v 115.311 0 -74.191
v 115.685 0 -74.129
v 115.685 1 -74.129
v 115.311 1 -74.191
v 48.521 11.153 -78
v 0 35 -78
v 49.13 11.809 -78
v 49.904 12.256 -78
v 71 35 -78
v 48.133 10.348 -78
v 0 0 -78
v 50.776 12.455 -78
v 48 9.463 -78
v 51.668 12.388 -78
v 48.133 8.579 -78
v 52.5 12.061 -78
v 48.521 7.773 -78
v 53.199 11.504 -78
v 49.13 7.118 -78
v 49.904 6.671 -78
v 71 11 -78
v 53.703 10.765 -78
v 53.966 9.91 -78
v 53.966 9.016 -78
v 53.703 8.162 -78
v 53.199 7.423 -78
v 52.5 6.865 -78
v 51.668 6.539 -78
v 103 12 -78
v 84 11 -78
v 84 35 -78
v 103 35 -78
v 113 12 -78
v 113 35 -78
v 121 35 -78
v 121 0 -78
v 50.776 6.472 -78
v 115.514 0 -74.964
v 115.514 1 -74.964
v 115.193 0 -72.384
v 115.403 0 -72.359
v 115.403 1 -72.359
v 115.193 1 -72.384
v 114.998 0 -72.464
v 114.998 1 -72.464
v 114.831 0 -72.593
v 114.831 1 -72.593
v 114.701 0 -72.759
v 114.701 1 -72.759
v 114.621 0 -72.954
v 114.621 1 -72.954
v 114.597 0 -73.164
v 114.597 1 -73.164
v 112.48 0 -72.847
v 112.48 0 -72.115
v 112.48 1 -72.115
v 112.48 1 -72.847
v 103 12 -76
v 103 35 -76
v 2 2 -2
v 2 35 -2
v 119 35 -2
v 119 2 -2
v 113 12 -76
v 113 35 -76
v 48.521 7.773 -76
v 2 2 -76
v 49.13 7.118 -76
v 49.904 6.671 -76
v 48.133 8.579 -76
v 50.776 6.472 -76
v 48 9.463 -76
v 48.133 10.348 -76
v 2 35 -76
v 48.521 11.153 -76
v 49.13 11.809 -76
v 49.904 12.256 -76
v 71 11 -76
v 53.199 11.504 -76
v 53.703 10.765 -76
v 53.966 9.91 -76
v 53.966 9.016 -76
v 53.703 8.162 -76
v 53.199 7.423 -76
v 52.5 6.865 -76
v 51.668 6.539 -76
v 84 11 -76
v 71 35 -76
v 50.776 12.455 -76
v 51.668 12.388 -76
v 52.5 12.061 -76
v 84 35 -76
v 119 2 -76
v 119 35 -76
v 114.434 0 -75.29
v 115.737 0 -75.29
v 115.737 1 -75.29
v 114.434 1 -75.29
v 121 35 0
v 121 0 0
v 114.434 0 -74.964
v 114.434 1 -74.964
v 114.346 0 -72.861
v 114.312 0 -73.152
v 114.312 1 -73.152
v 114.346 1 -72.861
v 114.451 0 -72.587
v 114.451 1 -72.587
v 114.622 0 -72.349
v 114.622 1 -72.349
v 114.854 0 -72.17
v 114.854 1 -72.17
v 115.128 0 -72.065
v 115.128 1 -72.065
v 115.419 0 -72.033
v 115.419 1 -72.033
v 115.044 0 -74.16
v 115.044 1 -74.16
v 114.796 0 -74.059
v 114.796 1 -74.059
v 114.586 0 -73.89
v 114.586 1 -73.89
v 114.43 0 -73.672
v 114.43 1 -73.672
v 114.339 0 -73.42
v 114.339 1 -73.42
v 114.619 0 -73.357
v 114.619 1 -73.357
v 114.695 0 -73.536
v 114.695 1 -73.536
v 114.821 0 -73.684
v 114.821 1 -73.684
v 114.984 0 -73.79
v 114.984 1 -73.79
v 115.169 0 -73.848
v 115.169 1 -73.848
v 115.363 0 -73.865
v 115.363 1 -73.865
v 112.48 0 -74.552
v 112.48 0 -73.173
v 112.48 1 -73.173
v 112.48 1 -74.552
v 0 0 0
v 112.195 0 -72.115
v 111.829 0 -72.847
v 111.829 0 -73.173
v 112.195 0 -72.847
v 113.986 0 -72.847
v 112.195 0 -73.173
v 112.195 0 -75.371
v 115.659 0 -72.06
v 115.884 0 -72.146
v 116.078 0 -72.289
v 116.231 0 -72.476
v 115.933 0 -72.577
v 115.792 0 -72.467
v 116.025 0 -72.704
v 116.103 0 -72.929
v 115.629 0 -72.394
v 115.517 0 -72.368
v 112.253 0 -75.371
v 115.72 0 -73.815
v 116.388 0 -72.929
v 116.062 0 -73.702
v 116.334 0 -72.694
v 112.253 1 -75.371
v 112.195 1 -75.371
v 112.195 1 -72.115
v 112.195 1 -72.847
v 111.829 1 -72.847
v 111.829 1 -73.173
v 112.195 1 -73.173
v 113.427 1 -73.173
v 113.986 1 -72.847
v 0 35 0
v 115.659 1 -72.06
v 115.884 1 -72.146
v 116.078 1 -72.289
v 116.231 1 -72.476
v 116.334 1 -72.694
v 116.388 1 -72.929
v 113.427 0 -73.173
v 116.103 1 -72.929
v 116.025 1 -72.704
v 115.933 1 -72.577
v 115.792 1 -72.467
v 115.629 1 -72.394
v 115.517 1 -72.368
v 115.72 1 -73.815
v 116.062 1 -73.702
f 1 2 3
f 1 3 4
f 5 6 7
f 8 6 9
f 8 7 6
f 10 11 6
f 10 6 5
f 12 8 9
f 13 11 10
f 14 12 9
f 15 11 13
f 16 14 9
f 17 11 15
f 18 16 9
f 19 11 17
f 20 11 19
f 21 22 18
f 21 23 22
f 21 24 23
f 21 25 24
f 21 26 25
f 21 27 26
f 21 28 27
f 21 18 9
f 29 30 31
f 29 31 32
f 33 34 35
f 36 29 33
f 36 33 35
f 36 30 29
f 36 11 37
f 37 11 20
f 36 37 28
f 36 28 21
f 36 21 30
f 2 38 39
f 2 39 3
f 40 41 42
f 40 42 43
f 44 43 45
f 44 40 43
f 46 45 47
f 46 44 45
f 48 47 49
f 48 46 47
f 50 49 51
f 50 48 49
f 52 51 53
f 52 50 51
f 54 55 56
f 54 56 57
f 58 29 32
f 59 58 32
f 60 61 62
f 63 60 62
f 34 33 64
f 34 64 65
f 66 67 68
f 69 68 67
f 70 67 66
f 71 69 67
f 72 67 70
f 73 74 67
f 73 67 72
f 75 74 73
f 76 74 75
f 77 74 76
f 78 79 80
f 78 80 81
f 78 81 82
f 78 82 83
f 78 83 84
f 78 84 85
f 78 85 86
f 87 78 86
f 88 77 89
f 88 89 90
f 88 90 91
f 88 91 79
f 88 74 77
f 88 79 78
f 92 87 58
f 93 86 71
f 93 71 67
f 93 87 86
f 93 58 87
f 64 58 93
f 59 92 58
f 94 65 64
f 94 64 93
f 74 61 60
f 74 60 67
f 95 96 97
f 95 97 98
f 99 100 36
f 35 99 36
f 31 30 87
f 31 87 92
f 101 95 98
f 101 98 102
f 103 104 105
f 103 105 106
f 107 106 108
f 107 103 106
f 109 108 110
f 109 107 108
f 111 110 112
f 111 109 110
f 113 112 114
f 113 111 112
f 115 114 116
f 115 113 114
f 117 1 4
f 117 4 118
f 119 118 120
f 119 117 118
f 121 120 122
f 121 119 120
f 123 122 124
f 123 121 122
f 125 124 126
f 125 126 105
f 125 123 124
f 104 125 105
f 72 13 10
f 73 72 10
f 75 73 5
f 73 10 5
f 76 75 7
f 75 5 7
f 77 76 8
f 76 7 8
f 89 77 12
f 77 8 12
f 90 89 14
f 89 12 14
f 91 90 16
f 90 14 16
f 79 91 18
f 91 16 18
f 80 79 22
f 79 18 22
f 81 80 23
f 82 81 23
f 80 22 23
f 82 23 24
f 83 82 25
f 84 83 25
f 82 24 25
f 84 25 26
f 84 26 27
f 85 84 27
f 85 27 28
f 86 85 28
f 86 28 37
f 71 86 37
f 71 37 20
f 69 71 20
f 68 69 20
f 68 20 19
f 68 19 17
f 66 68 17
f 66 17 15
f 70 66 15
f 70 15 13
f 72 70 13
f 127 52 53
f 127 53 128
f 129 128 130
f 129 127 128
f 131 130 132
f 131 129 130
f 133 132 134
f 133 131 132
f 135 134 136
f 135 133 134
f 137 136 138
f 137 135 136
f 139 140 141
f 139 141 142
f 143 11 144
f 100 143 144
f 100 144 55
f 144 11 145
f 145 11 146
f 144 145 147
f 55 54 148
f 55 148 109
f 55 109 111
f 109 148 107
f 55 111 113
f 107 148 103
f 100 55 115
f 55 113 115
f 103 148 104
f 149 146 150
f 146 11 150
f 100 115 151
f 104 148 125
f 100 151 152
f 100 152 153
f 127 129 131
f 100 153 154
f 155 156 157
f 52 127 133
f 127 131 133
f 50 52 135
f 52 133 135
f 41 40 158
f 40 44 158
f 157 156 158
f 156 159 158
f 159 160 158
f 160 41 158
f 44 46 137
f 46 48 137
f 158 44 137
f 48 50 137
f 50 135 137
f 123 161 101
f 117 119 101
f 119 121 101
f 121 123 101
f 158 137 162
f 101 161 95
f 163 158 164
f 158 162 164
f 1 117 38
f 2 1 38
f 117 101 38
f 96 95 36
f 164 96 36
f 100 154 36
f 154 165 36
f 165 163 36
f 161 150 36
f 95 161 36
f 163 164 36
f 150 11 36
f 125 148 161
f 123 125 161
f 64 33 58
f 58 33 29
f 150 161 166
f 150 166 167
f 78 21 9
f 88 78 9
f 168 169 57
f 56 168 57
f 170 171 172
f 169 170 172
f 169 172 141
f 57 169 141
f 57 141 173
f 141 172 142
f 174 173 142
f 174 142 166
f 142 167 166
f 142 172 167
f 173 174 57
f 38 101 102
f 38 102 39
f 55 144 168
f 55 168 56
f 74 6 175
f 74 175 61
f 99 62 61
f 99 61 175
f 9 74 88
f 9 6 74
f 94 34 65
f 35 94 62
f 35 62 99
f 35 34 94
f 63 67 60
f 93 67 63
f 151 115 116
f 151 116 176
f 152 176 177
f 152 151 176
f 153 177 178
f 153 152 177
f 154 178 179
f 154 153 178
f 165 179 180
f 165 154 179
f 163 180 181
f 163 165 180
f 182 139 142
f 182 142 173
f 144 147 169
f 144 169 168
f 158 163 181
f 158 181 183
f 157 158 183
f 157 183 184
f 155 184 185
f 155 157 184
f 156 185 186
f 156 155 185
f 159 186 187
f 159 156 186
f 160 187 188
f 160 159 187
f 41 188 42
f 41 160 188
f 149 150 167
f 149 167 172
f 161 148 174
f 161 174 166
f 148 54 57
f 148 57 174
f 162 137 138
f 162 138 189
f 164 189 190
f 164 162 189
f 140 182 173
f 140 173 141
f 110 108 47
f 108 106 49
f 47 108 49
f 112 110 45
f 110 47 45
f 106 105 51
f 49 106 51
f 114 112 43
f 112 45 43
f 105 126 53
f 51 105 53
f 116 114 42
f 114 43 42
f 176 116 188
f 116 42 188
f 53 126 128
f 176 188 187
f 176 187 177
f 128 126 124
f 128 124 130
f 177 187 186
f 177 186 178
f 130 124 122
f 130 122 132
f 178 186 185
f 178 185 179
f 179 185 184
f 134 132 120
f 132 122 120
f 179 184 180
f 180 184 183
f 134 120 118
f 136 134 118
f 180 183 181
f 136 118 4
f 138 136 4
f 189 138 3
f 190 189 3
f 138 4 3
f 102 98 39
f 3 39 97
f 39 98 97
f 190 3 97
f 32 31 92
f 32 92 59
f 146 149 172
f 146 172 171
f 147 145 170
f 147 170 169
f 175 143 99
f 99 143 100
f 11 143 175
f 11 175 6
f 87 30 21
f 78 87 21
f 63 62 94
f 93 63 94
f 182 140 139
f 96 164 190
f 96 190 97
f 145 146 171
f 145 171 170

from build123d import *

# Parameters (mm, degrees)
SKETCH1_W           = 121
SKETCH1_H           = 78
BOSS_EXTRUDE3_DEPTH = 35
SKETCH4_W           = 117
SKETCH4_H           = 74
CUT_EXTRUDE1_DEPTH  = 33
SKETCH5_W           = 10
SKETCH5_H           = 23
SKETCH5_W_2         = 13
SKETCH5_H_2         = 24
CUT_EXTRUDE2_DEPTH  = 33
SKETCH6_R           = 3
CUT_EXTRUDE3_DEPTH  = 33
CUT_EXTRUDE4_DEPTH  = 1


with BuildPart() as part:
    # Sketch1 → Boss-Extrude3 (new body)
    with BuildSketch(Plane(origin=(0, 0, 0), x_dir=(1, 0, 0), z_dir=(0, 1, 0))):
        with Locations((60.5, 39)):
            Rectangle(SKETCH1_W, SKETCH1_H)
    extrude(amount=BOSS_EXTRUDE3_DEPTH)

    # Sketch4 → Cut-Extrude1 (cut)
    with BuildSketch(Plane(origin=(0, 35, 0), x_dir=(1, 0, 0), z_dir=(0, 1, 0))):
        with Locations((60.5, 39)):
            Rectangle(SKETCH4_W, SKETCH4_H)
    extrude(amount=-CUT_EXTRUDE1_DEPTH, mode=Mode.SUBTRACT)

    # Sketch5 → Cut-Extrude2 (cut)
    with BuildSketch(Plane(origin=(0, 0, -78), x_dir=(-1, 0, 0), z_dir=(0, 0, -1))):
        with Locations((-108, 23.5)):
            Rectangle(SKETCH5_W, SKETCH5_H)
        with Locations((-77.5, 23)):
            Rectangle(SKETCH5_W_2, SKETCH5_H_2)
    extrude(amount=-CUT_EXTRUDE2_DEPTH, mode=Mode.SUBTRACT)

    # Sketch6 → Cut-Extrude3 (cut)
    with BuildSketch(Plane(origin=(0, 0, -78), x_dir=(-1, 0, 0), z_dir=(0, 0, -1))):
        with Locations((-51, 9.463298595)):
            Circle(SKETCH6_R)
    extrude(amount=-CUT_EXTRUDE3_DEPTH, mode=Mode.SUBTRACT)

    # Sketch7 → Cut-Extrude4 (cut)
    with BuildSketch(Plane(origin=(0, 0, 0), x_dir=(-1, 0, 0), z_dir=(0, -1, 0))):
        with BuildLine():
            Line((-114.434159313, 75.289773702), (-114.434159313, 74.964132677))
            Line((-114.434159313, 74.964132677), (-115.514117246, 74.964132677))
            Line((-115.514117246, 74.964132677), (-115.685205988, 74.129041531))
            add(Edge.make_bspline(
                [(-115.685205988, 74.129041531), (-115.651591016, 74.138321849), (-115.586467325, 74.156300997), (-115.490346594, 74.176263375), (-115.399095095, 74.188297028), (-115.339881009, 74.189940145), (-115.311227623, 74.190735241)],
                knots=[0, 0, 0, 0, 0.000104595, 0.000202637, 0.000294305, 0.000380252, 0.000380252, 0.000380252, 0.000380252], degree=3))
            add(Edge.make_bspline(
                [(-115.311227623, 74.190735241), (-115.275773087, 74.189967856), (-115.206060613, 74.188458987), (-115.104062425, 74.173970238), (-115.006696157, 74.151164744), (-114.914165436, 74.119305413), (-114.826299079, 74.078565869), (-114.743905506, 74.027675209), (-114.66574797, 73.968227116), (-114.593228617, 73.899878427), (-114.527438709, 73.824656674), (-114.469593847, 73.743777748), (-114.42046064, 73.658027655), (-114.380944812, 73.566587103), (-114.349390452, 73.470467013), (-114.328388285, 73.368656028), (-114.314403128, 73.262113805), (-114.312840677, 73.189266088), (-114.312043929, 73.152118454)],
                knots=[0, 0, 0, 0, 0.000106308, 0.000209029, 0.000308378, 0.000405929, 0.000502102, 0.000598312, 0.00069588, 0.000796219, 0.000896736, 0.000995218, 0.001094066, 0.001192613, 0.001293582, 0.001396995, 0.001504047, 0.001615439, 0.001615439, 0.001615439, 0.001615439], degree=3))
            add(Edge.make_bspline(
                [(-114.312043929, 73.152118454), (-114.312647247, 73.126244726), (-114.31384573, 73.07484693), (-114.319940449, 72.998516119), (-114.331674991, 72.923801263), (-114.347429998, 72.850692451), (-114.367879192, 72.779328092), (-114.392634262, 72.70950392), (-114.42292923, 72.641654527), (-114.45615912, 72.575137918), (-114.493575568, 72.511457844), (-114.535103214, 72.451904835), (-114.578977624, 72.395585522), (-114.626186595, 72.343103922), (-114.677168926, 72.294804898), (-114.731307182, 72.250401814), (-114.788169363, 72.20914375), (-114.84863519, 72.172705459), (-114.911357299, 72.139174777), (-114.977241468, 72.111666997), (-115.04478796, 72.087073875), (-115.114968955, 72.067470947), (-115.187625485, 72.052110701), (-115.262877317, 72.041678013), (-115.340329782, 72.034079388), (-115.392830686, 72.033603721), (-115.419350619, 72.033363446)],
                knots=[0, 0, 0, 0, 7.7636e-05, 0.000154223, 0.000229512, 0.000304362, 0.000378447, 0.000452077, 0.000526407, 0.000601214, 0.00067506, 0.000747747, 0.00081887, 0.000889121, 0.000959302, 0.001029336, 0.001099058, 0.00116985, 0.001240974, 0.00131221, 0.00138383, 0.001456517, 0.001530612, 0.001606437, 0.001684346, 0.001763871, 0.001763871, 0.001763871, 0.001763871], degree=3))
            add(Edge.make_bspline(
                [(-115.419350619, 72.033363446), (-115.450986483, 72.033990135), (-115.513226308, 72.035223071), (-115.604412823, 72.048121268), (-115.692146786, 72.066594249), (-115.77572195, 72.094385723), (-115.85588731, 72.129208483), (-115.931563633, 72.173219581), (-116.004684587, 72.223093483), (-116.072277649, 72.281949231), (-116.135012123, 72.346279886), (-116.19117017, 72.41609146), (-116.241184201, 72.49023174), (-116.2842533, 72.56906078), (-116.320990791, 72.652371447), (-116.34985153, 72.740475884), (-116.373145466, 72.832913744), (-116.38300014, 72.896553), (-116.388005467, 72.928876267)],
                knots=[0, 0, 0, 0, 9.4843e-05, 0.000186593, 0.000275792, 0.000363484, 0.000450342, 0.000537514, 0.000625728, 0.000715478, 0.000805885, 0.000894984, 0.00098389, 0.001073836, 0.001164117, 0.001256635, 0.001351658, 0.001449737, 0.001449737, 0.001449737, 0.001449737], degree=3))
            Line((-116.388005467, 72.928876267), (-116.10306957, 72.928876267))
            add(Edge.make_bspline(
                [(-116.10306957, 72.928876267), (-116.096058664, 72.898599056), (-116.082583314, 72.840404576), (-116.053005242, 72.758642574), (-116.016841198, 72.685781564), (-115.973838682, 72.620857728), (-115.922539726, 72.564243852), (-115.864002315, 72.513791231), (-115.798372595, 72.468275221), (-115.725444451, 72.430335996), (-115.648506872, 72.397979342), (-115.567982331, 72.376433161), (-115.486063388, 72.361283065), (-115.430656581, 72.35976654), (-115.402814161, 72.359004472)],
                knots=[0, 0, 0, 0, 9.3172e-05, 0.000179081, 0.000260145, 0.000336703, 0.000411917, 0.000488562, 0.000568128, 0.000650923, 0.00073478, 0.000817953, 0.000900557, 0.000983994, 0.000983994, 0.000983994, 0.000983994], degree=3))
            add(Edge.make_bspline(
                [(-115.402814161, 72.359004472), (-115.375637572, 72.359749034), (-115.322126646, 72.361215085), (-115.243376317, 72.372499046), (-115.167346067, 72.3898777), (-115.094786107, 72.415885354), (-115.024426711, 72.447494491), (-114.958047648, 72.488057453), (-114.893728609, 72.534739041), (-114.833468802, 72.588221127), (-114.77827873, 72.647157921), (-114.729514249, 72.710183842), (-114.688895192, 72.77741841), (-114.654664965, 72.847697628), (-114.628672329, 72.921791747), (-114.610129439, 72.999353528), (-114.59924095, 73.080574545), (-114.597743094, 73.135973134), (-114.596979826, 73.164202789)],
                knots=[0, 0, 0, 0, 8.15e-05, 0.000160473, 0.000238226, 0.000315066, 0.000391338, 0.000469218, 0.000547964, 0.000629516, 0.000710512, 0.000789892, 0.000868102, 0.000945761, 0.001024012, 0.00110315, 0.001184644, 0.001269321, 0.001269321, 0.001269321, 0.001269321], degree=3))
            add(Edge.make_bspline(
                [(-114.596979826, 73.164202789), (-114.597577161, 73.189671506), (-114.598746359, 73.239522897), (-114.608299091, 73.312456463), (-114.624915201, 73.38146558), (-114.647978293, 73.446883492), (-114.677260417, 73.508771901), (-114.713043858, 73.567194677), (-114.756000155, 73.621381797), (-114.805069225, 73.671358613), (-114.858824733, 73.717482178), (-114.918191557, 73.756801457), (-114.981927348, 73.789879439), (-115.049264199, 73.818425409), (-115.121803785, 73.838927514), (-115.198109588, 73.85431981), (-115.279005601, 73.863223746), (-115.334314725, 73.864459174), (-115.36274505, 73.865094215)],
                knots=[0, 0, 0, 0, 7.6388e-05, 0.000149519, 0.000220172, 0.000288967, 0.000357247, 0.000425206, 0.000494043, 0.000564207, 0.000635056, 0.000706145, 0.000777268, 0.000850264, 0.000925136, 0.001002969, 0.001083601, 0.001168886, 0.001168886, 0.001168886, 0.001168886], degree=3))
            add(Edge.make_bspline(
                [(-115.36274505, 73.865094215), (-115.387354864, 73.864567536), (-115.438167887, 73.863480077), (-115.516112165, 73.855473184), (-115.598019657, 73.84255611), (-115.683576378, 73.824788585), (-115.773039267, 73.801537537), (-115.866219531, 73.773675097), (-115.963313087, 73.740362998), (-116.028734165, 73.715205919), (-116.062364441, 73.702273702)],
                knots=[0, 0, 0, 0, 7.3822e-05, 0.000152423, 0.000234822, 0.000322511, 0.00041445, 0.000512043, 0.000614219, 0.000722306, 0.000722306, 0.000722306, 0.000722306], degree=3))
            Line((-116.062364441, 73.702273702), (-115.736723416, 75.289773702))
            Line((-115.736723416, 75.289773702), (-114.434159313, 75.289773702))
        make_face()
        Polygon((-112.253254866, 75.371183959), (-112.195377262, 75.371183959), (-112.195377262, 73.173107036), (-111.829031108, 73.173107036), (-111.829031108, 72.84746601), (-112.195377262, 72.84746601), (-112.195377262, 72.114773702), (-112.480313159, 72.114773702), (-112.480313159, 72.84746601), (-113.986402903, 72.84746601), align=None)
        Polygon((-112.480313159, 73.173107036), (-112.480313159, 74.551993254), (-113.42670739, 73.173107036), align=None, mode=Mode.SUBTRACT)
    extrude(amount=-CUT_EXTRUDE4_DEPTH, mode=Mode.SUBTRACT)


solid = part.part
